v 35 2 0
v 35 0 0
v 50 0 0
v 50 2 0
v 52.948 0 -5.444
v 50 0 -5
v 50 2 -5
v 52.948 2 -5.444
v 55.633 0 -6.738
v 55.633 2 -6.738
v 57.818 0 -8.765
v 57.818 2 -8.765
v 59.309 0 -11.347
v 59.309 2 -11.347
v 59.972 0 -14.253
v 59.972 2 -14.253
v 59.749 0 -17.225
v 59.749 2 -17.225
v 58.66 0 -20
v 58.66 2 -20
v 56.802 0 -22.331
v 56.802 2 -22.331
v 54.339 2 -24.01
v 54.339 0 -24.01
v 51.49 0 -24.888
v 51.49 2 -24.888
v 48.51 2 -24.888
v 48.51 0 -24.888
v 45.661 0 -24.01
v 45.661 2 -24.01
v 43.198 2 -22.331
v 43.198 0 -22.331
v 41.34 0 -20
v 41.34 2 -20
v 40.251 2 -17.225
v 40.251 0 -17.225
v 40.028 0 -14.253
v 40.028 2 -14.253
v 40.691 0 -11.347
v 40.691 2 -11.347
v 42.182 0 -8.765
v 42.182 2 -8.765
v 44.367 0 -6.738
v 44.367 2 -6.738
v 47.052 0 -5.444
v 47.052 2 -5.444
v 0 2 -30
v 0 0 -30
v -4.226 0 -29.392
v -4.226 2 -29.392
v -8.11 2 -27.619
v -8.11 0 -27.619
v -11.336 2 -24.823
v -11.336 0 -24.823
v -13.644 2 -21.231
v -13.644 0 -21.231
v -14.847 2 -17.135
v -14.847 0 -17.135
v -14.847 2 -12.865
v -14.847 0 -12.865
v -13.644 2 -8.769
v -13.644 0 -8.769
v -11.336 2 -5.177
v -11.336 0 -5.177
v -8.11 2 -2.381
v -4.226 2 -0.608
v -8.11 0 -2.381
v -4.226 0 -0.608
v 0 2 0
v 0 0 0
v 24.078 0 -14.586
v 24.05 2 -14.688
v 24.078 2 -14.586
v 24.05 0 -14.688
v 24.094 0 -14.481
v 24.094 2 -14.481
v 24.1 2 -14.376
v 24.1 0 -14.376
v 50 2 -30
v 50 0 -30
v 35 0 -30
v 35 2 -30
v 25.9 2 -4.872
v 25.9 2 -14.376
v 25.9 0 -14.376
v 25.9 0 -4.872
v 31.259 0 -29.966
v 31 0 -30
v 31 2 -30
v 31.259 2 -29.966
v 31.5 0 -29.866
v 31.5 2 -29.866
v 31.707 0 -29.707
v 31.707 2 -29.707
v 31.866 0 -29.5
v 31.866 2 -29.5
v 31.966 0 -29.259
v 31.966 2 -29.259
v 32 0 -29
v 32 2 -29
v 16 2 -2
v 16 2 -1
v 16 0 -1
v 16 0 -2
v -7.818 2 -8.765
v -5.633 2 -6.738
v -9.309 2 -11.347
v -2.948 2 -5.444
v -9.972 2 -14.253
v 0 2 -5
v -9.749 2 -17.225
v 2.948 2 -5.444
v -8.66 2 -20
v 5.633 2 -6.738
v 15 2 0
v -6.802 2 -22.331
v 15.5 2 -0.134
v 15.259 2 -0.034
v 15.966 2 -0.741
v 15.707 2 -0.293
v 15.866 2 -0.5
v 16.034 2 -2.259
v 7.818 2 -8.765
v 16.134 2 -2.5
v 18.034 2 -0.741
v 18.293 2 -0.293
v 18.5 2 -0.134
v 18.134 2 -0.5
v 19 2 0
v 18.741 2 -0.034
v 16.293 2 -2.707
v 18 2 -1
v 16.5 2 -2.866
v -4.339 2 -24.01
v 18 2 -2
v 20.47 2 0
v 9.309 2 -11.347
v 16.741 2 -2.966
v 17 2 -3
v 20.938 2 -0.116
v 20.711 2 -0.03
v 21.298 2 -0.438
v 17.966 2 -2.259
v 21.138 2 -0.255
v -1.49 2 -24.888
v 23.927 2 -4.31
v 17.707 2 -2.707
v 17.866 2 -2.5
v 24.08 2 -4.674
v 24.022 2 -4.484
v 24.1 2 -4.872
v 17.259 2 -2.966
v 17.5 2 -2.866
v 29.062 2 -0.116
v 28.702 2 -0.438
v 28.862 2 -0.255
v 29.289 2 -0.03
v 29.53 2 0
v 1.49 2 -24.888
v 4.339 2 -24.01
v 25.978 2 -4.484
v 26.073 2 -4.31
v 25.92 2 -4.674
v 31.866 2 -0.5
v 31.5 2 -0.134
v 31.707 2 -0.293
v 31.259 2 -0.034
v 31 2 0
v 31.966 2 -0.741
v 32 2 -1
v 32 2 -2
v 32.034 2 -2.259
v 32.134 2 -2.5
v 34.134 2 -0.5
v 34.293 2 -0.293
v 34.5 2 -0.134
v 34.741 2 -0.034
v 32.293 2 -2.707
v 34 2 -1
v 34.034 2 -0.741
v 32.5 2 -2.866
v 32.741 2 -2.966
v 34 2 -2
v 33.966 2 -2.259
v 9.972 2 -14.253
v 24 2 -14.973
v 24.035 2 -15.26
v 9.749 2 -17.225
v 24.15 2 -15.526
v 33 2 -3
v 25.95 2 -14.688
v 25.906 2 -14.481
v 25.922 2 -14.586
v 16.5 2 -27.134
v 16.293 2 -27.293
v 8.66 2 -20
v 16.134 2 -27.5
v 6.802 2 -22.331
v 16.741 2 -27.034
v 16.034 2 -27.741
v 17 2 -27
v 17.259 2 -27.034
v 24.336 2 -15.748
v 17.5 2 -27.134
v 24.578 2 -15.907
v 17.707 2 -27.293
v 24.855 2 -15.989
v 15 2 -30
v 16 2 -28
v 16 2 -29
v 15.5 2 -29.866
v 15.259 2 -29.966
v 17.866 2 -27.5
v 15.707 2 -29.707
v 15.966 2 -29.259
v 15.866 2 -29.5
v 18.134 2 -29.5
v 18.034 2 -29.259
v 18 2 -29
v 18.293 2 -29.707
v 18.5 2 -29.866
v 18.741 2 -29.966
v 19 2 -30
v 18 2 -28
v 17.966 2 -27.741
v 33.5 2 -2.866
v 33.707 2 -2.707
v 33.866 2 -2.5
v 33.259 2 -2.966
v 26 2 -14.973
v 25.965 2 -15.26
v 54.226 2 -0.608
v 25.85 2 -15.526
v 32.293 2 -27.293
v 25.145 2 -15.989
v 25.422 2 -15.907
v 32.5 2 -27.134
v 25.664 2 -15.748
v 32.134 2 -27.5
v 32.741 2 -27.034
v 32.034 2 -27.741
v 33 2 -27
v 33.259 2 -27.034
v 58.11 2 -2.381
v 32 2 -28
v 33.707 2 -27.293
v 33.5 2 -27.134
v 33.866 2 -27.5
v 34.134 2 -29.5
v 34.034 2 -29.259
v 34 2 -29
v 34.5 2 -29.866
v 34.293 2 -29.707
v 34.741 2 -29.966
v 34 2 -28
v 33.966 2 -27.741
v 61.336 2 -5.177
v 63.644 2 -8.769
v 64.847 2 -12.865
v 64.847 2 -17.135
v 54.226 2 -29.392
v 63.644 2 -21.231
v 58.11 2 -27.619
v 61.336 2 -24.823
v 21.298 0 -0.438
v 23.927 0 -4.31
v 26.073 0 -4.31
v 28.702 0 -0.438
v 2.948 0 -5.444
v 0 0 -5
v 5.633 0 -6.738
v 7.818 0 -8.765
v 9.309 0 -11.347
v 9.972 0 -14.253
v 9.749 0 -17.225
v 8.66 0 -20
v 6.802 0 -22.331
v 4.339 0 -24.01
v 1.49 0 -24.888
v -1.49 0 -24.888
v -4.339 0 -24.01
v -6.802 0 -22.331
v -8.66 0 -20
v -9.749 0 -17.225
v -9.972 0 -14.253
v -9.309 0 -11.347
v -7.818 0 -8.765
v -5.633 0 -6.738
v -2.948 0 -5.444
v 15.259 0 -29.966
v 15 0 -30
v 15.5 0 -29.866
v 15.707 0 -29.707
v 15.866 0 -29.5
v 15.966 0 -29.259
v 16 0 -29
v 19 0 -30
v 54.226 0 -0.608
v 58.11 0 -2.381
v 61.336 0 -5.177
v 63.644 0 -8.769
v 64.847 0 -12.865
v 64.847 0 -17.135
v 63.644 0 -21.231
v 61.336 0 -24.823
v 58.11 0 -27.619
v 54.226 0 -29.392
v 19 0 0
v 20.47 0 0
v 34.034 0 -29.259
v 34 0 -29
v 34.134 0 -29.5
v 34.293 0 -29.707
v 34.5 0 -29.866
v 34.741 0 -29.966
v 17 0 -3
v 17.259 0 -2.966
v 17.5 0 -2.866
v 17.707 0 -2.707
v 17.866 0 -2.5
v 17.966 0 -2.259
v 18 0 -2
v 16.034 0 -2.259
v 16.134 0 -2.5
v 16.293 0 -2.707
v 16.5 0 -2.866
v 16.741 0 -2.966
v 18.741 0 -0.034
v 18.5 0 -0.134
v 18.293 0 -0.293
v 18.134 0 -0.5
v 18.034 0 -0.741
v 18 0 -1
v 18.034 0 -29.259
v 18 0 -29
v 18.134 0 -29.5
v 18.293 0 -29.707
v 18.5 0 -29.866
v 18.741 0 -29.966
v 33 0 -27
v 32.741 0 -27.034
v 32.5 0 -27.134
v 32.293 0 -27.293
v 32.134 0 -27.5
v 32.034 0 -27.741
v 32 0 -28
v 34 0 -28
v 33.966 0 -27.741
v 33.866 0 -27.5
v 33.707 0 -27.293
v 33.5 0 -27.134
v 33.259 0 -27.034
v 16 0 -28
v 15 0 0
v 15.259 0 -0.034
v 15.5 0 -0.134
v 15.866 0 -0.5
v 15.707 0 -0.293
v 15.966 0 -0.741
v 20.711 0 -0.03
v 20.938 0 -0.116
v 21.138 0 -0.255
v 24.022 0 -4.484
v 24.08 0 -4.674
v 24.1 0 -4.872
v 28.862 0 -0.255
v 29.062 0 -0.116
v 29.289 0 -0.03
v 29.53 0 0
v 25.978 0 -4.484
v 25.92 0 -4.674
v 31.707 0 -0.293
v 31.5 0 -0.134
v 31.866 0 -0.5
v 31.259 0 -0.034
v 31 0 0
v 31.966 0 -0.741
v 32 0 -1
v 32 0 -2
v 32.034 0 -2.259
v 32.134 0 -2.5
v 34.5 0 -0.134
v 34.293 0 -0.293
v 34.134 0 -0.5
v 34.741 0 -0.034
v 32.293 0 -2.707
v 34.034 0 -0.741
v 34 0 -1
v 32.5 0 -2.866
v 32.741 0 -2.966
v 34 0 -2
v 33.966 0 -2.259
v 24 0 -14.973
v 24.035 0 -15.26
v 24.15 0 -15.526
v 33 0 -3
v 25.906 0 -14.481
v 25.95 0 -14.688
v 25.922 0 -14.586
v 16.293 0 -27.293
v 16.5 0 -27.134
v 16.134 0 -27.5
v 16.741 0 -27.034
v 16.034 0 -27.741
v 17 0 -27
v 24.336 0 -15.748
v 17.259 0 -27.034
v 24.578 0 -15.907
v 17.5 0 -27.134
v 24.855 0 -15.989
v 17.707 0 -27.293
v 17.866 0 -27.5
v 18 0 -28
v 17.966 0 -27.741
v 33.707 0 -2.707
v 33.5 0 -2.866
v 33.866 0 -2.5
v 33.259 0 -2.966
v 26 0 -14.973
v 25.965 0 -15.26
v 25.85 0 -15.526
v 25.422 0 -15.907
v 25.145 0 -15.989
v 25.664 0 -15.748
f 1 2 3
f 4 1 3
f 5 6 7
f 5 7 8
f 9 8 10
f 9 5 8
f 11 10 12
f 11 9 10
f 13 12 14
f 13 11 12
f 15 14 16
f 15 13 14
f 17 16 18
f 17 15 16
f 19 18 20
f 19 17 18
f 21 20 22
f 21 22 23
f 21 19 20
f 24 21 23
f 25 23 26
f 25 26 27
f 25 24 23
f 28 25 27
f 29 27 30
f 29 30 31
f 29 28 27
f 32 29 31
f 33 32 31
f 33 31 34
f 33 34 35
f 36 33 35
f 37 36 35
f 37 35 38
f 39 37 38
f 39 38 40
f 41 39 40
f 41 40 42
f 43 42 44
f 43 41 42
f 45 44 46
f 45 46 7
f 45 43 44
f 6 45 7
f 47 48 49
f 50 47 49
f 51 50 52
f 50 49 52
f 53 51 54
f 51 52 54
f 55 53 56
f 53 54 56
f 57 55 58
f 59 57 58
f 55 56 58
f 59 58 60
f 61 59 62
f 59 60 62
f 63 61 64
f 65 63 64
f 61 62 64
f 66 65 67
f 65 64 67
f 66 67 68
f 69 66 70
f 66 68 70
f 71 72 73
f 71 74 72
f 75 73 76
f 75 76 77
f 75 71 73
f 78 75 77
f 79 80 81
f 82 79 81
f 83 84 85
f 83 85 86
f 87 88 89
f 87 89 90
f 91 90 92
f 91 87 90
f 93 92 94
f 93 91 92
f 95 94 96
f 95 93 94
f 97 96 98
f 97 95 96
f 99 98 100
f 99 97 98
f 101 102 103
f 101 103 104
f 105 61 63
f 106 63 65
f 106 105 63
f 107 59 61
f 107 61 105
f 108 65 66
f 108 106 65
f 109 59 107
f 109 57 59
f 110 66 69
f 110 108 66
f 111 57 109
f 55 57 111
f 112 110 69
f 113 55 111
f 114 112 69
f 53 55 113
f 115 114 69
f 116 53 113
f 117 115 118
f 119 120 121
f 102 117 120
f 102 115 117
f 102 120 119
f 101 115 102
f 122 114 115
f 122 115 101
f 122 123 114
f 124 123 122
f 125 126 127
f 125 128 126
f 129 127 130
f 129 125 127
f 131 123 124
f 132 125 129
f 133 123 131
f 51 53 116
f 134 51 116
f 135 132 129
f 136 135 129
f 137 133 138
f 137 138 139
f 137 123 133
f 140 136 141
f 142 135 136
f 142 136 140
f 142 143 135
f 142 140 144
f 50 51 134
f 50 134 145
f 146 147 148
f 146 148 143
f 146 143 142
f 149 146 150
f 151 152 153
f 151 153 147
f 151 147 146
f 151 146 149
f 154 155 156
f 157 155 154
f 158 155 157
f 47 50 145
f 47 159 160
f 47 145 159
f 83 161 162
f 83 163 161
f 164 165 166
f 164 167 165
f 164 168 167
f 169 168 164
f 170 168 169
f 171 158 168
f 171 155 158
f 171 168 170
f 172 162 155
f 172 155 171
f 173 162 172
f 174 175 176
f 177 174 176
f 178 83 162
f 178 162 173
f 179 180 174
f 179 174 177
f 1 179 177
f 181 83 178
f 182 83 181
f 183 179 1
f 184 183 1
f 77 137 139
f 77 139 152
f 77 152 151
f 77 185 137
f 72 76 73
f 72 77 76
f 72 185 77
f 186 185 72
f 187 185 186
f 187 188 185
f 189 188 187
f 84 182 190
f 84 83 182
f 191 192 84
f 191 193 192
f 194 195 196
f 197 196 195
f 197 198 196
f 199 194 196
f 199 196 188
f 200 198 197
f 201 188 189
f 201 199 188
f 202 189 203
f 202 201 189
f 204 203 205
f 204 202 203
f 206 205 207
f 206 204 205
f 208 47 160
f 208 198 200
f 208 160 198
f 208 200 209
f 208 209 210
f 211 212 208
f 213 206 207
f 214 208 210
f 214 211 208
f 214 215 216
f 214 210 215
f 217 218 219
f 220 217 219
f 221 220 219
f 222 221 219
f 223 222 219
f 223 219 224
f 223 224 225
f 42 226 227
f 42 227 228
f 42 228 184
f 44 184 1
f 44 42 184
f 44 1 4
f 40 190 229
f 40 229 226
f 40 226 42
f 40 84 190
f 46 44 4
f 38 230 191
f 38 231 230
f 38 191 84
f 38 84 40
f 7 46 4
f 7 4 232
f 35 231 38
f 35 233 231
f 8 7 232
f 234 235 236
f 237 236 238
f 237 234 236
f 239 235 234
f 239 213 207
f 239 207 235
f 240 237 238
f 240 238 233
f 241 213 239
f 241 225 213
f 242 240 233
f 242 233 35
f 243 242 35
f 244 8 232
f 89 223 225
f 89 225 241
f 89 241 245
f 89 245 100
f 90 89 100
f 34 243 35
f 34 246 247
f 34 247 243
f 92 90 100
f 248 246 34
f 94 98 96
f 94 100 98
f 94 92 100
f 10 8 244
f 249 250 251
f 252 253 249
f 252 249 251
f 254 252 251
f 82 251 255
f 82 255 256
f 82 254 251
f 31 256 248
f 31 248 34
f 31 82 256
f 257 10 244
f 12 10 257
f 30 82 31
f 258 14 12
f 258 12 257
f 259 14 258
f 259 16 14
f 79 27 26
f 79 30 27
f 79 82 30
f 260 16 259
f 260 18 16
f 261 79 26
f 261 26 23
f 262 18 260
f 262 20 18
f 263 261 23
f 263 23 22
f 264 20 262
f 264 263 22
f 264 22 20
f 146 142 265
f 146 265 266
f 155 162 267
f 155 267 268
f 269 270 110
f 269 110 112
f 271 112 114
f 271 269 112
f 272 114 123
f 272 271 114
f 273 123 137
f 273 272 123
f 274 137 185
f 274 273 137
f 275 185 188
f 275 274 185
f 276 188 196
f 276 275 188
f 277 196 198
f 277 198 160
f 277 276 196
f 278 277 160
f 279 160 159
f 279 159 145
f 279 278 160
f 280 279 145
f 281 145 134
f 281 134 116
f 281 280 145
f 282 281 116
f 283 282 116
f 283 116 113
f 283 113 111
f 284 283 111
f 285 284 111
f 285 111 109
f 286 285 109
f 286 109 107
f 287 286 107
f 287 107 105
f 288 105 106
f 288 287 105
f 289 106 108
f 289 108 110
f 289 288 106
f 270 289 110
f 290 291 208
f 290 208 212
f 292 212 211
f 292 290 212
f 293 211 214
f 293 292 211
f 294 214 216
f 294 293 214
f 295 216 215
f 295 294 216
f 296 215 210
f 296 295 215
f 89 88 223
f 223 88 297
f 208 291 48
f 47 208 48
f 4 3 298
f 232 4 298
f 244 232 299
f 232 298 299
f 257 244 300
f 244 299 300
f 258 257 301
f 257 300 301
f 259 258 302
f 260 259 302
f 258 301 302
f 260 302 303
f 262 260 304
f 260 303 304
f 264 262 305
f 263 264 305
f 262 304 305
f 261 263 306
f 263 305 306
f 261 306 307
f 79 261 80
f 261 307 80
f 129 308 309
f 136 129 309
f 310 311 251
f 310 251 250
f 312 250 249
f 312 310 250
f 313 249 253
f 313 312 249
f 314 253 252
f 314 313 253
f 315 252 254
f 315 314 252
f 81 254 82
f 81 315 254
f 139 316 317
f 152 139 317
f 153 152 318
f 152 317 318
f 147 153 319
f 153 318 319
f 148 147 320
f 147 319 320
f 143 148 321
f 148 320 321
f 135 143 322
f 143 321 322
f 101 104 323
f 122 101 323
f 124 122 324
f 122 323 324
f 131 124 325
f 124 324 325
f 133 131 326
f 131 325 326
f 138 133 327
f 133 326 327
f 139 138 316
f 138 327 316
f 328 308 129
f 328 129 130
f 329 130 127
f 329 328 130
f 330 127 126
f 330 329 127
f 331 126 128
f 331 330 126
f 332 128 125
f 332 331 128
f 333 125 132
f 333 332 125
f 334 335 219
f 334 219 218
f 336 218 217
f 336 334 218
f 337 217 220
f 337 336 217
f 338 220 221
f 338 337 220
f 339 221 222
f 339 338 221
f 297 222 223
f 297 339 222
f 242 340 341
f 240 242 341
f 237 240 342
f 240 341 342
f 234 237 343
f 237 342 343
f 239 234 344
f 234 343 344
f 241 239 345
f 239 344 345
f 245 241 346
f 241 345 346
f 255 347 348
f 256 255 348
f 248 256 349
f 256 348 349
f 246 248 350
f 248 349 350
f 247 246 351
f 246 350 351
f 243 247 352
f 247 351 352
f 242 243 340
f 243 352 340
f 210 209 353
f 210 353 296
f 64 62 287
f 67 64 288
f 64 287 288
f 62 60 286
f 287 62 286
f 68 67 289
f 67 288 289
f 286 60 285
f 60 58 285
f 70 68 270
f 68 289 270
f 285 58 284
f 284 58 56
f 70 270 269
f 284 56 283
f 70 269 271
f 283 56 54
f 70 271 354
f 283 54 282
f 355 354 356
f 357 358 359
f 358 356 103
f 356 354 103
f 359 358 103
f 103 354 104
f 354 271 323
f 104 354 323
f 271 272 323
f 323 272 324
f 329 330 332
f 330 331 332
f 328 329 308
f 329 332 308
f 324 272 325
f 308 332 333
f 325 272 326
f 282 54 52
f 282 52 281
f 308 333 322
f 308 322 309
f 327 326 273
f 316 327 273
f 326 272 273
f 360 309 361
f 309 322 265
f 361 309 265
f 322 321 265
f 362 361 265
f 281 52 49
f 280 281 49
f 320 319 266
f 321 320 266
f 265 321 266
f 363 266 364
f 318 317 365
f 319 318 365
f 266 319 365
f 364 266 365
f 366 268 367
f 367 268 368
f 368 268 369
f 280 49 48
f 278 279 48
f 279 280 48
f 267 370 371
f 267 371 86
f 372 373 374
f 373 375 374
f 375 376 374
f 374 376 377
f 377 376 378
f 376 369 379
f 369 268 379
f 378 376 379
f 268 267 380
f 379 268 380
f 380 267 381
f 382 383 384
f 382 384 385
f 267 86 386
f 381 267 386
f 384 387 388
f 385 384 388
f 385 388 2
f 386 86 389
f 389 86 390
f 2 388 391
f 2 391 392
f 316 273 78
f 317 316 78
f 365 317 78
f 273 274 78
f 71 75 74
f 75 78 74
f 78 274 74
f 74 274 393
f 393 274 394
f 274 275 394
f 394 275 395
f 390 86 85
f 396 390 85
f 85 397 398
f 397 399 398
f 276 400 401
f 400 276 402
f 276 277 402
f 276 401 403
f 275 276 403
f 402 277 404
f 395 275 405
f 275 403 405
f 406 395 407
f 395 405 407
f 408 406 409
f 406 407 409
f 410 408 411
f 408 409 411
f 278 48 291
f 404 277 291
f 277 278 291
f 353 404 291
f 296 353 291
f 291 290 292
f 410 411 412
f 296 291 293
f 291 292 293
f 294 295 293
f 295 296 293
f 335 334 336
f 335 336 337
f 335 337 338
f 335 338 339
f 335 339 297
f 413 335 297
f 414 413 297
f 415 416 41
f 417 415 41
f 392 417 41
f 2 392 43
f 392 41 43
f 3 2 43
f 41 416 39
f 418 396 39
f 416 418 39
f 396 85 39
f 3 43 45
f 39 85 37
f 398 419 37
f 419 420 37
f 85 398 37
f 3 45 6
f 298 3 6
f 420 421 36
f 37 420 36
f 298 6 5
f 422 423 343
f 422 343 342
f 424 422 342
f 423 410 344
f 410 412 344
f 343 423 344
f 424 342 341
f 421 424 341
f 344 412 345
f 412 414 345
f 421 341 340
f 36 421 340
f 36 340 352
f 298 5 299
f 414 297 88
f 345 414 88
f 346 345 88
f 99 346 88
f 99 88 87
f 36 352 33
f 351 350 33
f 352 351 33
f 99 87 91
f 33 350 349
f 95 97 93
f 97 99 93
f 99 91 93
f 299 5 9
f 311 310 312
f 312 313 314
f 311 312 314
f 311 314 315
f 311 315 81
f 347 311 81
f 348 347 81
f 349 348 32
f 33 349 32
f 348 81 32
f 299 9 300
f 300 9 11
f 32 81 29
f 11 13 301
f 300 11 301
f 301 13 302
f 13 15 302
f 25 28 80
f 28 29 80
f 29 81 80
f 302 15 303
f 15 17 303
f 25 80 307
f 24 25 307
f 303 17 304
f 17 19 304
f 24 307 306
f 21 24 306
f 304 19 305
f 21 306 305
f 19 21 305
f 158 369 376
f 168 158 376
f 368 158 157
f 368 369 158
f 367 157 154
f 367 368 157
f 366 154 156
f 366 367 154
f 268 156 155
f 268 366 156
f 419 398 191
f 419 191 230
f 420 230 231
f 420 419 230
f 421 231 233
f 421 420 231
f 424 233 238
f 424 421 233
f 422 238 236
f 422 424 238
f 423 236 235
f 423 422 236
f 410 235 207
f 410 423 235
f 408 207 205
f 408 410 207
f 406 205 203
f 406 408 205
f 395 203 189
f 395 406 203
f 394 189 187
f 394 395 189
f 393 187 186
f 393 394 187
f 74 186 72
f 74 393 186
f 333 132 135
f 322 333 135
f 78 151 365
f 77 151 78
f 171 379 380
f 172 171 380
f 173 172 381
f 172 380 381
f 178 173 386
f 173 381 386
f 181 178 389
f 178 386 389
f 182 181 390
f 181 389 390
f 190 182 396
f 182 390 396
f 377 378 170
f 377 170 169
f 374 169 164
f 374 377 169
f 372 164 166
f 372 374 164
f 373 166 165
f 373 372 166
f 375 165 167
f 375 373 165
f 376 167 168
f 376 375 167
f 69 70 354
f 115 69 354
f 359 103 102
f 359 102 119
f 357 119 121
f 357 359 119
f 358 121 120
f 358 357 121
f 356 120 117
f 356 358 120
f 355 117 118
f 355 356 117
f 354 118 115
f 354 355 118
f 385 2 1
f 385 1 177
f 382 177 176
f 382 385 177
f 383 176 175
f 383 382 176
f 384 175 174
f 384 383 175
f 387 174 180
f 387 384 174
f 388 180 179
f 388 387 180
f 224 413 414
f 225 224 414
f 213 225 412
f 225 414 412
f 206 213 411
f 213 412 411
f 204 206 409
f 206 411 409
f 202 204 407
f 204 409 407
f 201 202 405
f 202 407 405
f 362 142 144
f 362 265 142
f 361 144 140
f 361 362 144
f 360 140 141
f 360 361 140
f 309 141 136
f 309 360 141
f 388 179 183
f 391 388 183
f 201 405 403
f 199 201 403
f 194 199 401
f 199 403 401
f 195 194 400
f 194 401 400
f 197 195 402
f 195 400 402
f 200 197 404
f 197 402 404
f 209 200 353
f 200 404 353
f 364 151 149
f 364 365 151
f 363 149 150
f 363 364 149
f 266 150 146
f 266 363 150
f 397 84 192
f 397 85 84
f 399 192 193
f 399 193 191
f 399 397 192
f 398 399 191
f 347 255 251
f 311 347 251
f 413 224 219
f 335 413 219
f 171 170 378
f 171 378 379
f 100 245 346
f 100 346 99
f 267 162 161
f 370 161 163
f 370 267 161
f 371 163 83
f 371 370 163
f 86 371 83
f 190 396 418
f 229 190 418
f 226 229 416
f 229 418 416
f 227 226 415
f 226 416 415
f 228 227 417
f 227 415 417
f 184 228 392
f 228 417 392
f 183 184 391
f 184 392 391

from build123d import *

# Parameters (mm, degrees)
SKETCH1_R           = 10
SKETCH1_R_2         = 1
BOSS_EXTRUDE1_DEPTH = 2
SKETCH2_W           = 2
SKETCH2_H           = 3
CUT_EXTRUDE1_DEPTH  = 72.617037079
FILLET1_START       = -1
FILLET1_DEPTH       = 4
FILLET1_2_DEPTH     = 2
CUT_EXTRUDE2_DEPTH  = 72.617037079
FILLET2_R           = 1


with BuildPart() as part:
    # Sketch1 → Boss-Extrude1 (new body)
    with BuildSketch(Plane(origin=(0, 0, 0), x_dir=(1, 0, 0), z_dir=(0, 1, 0))):
        with BuildLine():
            Line((0, 0), (50, 0))
            ThreePointArc((50, 0), (65, 15), (50, 30))
            Line((50, 30), (0, 30))
            ThreePointArc((0, 30), (-15, 15), (0, 0))
        make_face()
        with Locations(Location((0, 15, 0), (0, 0, 270))):
            Circle(SKETCH1_R, mode=Mode.SUBTRACT)
        with Locations(Location((50, 15, 0), (0, 0, 270))):
            Circle(SKETCH1_R, mode=Mode.SUBTRACT)
        with Locations(Location((25, 15, 0), (0, 0, 270))):
            Circle(SKETCH1_R_2, mode=Mode.SUBTRACT)
    extrude(amount=BOSS_EXTRUDE1_DEPTH)

    # Sketch2 → Cut-Extrude1 (cut, through all)
    with BuildSketch(Plane(origin=(0, 2, 0), x_dir=(1, 0, 0), z_dir=(0, 1, 0))):
        with Locations((17, 28.5)):
            Rectangle(SKETCH2_W, SKETCH2_H)
        with Locations((33, 28.5)):
            Rectangle(SKETCH2_W, SKETCH2_H)
        with Locations((17, 1.5)):
            Rectangle(SKETCH2_W, SKETCH2_H)
        with Locations((33, 1.5)):
            Rectangle(SKETCH2_W, SKETCH2_H)
    extrude(amount=-CUT_EXTRUDE1_DEPTH, mode=Mode.SUBTRACT)

    # Fillet1: read off the stored shape, not the designer's step
    # Fillet1 outline → Fillet1 (cut)
    with BuildSketch(Plane(origin=(0, 0, 0), x_dir=(1, 0, 0), z_dir=(0, 1, 0)).offset(FILLET1_START)):
        with BuildLine():
            ThreePointArc((35, 0), (34.292893219, 0.292893219), (34, 1))
            Line((34, 1), (34, 0))
            Line((34, 0), (35, 0))
        make_face()
        with BuildLine():
            ThreePointArc((32, 1), (31.707106781, 0.292893219), (31, 0))
            Line((31, 0), (32, 0))
            Line((32, 0), (32, 1))
        make_face()
        with BuildLine():
            ThreePointArc((19, 0), (18.292893219, 0.292893219), (18, 1))
            Line((18, 1), (18, 0))
            Line((18, 0), (19, 0))
        make_face()
        with BuildLine():
            ThreePointArc((16, 1), (15.707106781, 0.292893219), (15, 0))
            Line((15, 0), (16, 0))
            Line((16, 0), (16, 1))
        make_face()
        with BuildLine():
            ThreePointArc((15, 30), (15.707106781, 29.707106781), (16, 29))
            Line((16, 29), (16, 30))
            Line((16, 30), (15, 30))
        make_face()
        with BuildLine():
            ThreePointArc((18, 29), (18.292893219, 29.707106781), (19, 30))
            Line((19, 30), (18, 30))
            Line((18, 30), (18, 29))
        make_face()
        with BuildLine():
            ThreePointArc((31, 30), (31.707106781, 29.707106781), (32, 29))
            Line((32, 29), (32, 30))
            Line((32, 30), (31, 30))
        make_face()
        with BuildLine():
            ThreePointArc((34, 29), (34.292893219, 29.707106781), (35, 30))
            Line((35, 30), (34, 30))
            Line((34, 30), (34, 29))
        make_face()
    extrude(amount=FILLET1_DEPTH, mode=Mode.SUBTRACT)

    # Fillet1 2 outline → Fillet1 2 (add)
    with BuildSketch(Plane(origin=(0, 0, 0), x_dir=(1, 0, 0), z_dir=(0, 1, 0))):
        with BuildLine():
            Line((34, 3), (33, 3))
            ThreePointArc((33, 3), (33.707106781, 2.707106781), (34, 2))
            Line((34, 2), (34, 3))
        make_face()
        with BuildLine():
            Line((32, 3), (32, 2))
            ThreePointArc((32, 2), (32.292893219, 2.707106781), (33, 3))
            Line((33, 3), (32, 3))
        make_face()
        with BuildLine():
            Line((18, 3), (17, 3))
            ThreePointArc((17, 3), (17.707106781, 2.707106781), (18, 2))
            Line((18, 2), (18, 3))
        make_face()
        with BuildLine():
            Line((16, 3), (16, 2))
            ThreePointArc((16, 2), (16.292893219, 2.707106781), (17, 3))
            Line((17, 3), (16, 3))
        make_face()
        with BuildLine():
            Line((16, 27), (17, 27))
            ThreePointArc((17, 27), (16.292893219, 27.292893219), (16, 28))
            Line((16, 28), (16, 27))
        make_face()
        with BuildLine():
            Line((18, 27), (18, 28))
            ThreePointArc((18, 28), (17.707106781, 27.292893219), (17, 27))
            Line((17, 27), (18, 27))
        make_face()
        with BuildLine():
            Line((32, 27), (33, 27))
            ThreePointArc((33, 27), (32.292893219, 27.292893219), (32, 28))
            Line((32, 28), (32, 27))
        make_face()
        with BuildLine():
            Line((34, 27), (34, 28))
            ThreePointArc((34, 28), (33.707106781, 27.292893219), (33, 27))
            Line((33, 27), (34, 27))
        make_face()
    extrude(amount=FILLET1_2_DEPTH)

    # Sketch3 → Cut-Extrude2 (cut, through all)
    with BuildSketch(Plane(origin=(0, 2, 0), x_dir=(1, 0, 0), z_dir=(0, 1, 0))):
        Polygon((24.1, 14.564110106), (25.9, 14.564110106), (25.9, 4.564110106), (29, 0), (21, 0), (24.1, 4.564110106), align=None)
    extrude(amount=-CUT_EXTRUDE2_DEPTH, mode=Mode.SUBTRACT)

    # Fillet2
    fillet2_edges = [part.edges().sort_by_distance(p)[0] for p in [
        (24.1, 1, -4.564110106),
        (24.1, 1, -14.564110106),
        (25.9, 1, -14.564110106),
        (25.9, 1, -4.564110106),
        (29, 1, 0),
        (21, 1, 0),
    ]]
    fillet(fillet2_edges, radius=FILLET2_R)


solid = part.part
